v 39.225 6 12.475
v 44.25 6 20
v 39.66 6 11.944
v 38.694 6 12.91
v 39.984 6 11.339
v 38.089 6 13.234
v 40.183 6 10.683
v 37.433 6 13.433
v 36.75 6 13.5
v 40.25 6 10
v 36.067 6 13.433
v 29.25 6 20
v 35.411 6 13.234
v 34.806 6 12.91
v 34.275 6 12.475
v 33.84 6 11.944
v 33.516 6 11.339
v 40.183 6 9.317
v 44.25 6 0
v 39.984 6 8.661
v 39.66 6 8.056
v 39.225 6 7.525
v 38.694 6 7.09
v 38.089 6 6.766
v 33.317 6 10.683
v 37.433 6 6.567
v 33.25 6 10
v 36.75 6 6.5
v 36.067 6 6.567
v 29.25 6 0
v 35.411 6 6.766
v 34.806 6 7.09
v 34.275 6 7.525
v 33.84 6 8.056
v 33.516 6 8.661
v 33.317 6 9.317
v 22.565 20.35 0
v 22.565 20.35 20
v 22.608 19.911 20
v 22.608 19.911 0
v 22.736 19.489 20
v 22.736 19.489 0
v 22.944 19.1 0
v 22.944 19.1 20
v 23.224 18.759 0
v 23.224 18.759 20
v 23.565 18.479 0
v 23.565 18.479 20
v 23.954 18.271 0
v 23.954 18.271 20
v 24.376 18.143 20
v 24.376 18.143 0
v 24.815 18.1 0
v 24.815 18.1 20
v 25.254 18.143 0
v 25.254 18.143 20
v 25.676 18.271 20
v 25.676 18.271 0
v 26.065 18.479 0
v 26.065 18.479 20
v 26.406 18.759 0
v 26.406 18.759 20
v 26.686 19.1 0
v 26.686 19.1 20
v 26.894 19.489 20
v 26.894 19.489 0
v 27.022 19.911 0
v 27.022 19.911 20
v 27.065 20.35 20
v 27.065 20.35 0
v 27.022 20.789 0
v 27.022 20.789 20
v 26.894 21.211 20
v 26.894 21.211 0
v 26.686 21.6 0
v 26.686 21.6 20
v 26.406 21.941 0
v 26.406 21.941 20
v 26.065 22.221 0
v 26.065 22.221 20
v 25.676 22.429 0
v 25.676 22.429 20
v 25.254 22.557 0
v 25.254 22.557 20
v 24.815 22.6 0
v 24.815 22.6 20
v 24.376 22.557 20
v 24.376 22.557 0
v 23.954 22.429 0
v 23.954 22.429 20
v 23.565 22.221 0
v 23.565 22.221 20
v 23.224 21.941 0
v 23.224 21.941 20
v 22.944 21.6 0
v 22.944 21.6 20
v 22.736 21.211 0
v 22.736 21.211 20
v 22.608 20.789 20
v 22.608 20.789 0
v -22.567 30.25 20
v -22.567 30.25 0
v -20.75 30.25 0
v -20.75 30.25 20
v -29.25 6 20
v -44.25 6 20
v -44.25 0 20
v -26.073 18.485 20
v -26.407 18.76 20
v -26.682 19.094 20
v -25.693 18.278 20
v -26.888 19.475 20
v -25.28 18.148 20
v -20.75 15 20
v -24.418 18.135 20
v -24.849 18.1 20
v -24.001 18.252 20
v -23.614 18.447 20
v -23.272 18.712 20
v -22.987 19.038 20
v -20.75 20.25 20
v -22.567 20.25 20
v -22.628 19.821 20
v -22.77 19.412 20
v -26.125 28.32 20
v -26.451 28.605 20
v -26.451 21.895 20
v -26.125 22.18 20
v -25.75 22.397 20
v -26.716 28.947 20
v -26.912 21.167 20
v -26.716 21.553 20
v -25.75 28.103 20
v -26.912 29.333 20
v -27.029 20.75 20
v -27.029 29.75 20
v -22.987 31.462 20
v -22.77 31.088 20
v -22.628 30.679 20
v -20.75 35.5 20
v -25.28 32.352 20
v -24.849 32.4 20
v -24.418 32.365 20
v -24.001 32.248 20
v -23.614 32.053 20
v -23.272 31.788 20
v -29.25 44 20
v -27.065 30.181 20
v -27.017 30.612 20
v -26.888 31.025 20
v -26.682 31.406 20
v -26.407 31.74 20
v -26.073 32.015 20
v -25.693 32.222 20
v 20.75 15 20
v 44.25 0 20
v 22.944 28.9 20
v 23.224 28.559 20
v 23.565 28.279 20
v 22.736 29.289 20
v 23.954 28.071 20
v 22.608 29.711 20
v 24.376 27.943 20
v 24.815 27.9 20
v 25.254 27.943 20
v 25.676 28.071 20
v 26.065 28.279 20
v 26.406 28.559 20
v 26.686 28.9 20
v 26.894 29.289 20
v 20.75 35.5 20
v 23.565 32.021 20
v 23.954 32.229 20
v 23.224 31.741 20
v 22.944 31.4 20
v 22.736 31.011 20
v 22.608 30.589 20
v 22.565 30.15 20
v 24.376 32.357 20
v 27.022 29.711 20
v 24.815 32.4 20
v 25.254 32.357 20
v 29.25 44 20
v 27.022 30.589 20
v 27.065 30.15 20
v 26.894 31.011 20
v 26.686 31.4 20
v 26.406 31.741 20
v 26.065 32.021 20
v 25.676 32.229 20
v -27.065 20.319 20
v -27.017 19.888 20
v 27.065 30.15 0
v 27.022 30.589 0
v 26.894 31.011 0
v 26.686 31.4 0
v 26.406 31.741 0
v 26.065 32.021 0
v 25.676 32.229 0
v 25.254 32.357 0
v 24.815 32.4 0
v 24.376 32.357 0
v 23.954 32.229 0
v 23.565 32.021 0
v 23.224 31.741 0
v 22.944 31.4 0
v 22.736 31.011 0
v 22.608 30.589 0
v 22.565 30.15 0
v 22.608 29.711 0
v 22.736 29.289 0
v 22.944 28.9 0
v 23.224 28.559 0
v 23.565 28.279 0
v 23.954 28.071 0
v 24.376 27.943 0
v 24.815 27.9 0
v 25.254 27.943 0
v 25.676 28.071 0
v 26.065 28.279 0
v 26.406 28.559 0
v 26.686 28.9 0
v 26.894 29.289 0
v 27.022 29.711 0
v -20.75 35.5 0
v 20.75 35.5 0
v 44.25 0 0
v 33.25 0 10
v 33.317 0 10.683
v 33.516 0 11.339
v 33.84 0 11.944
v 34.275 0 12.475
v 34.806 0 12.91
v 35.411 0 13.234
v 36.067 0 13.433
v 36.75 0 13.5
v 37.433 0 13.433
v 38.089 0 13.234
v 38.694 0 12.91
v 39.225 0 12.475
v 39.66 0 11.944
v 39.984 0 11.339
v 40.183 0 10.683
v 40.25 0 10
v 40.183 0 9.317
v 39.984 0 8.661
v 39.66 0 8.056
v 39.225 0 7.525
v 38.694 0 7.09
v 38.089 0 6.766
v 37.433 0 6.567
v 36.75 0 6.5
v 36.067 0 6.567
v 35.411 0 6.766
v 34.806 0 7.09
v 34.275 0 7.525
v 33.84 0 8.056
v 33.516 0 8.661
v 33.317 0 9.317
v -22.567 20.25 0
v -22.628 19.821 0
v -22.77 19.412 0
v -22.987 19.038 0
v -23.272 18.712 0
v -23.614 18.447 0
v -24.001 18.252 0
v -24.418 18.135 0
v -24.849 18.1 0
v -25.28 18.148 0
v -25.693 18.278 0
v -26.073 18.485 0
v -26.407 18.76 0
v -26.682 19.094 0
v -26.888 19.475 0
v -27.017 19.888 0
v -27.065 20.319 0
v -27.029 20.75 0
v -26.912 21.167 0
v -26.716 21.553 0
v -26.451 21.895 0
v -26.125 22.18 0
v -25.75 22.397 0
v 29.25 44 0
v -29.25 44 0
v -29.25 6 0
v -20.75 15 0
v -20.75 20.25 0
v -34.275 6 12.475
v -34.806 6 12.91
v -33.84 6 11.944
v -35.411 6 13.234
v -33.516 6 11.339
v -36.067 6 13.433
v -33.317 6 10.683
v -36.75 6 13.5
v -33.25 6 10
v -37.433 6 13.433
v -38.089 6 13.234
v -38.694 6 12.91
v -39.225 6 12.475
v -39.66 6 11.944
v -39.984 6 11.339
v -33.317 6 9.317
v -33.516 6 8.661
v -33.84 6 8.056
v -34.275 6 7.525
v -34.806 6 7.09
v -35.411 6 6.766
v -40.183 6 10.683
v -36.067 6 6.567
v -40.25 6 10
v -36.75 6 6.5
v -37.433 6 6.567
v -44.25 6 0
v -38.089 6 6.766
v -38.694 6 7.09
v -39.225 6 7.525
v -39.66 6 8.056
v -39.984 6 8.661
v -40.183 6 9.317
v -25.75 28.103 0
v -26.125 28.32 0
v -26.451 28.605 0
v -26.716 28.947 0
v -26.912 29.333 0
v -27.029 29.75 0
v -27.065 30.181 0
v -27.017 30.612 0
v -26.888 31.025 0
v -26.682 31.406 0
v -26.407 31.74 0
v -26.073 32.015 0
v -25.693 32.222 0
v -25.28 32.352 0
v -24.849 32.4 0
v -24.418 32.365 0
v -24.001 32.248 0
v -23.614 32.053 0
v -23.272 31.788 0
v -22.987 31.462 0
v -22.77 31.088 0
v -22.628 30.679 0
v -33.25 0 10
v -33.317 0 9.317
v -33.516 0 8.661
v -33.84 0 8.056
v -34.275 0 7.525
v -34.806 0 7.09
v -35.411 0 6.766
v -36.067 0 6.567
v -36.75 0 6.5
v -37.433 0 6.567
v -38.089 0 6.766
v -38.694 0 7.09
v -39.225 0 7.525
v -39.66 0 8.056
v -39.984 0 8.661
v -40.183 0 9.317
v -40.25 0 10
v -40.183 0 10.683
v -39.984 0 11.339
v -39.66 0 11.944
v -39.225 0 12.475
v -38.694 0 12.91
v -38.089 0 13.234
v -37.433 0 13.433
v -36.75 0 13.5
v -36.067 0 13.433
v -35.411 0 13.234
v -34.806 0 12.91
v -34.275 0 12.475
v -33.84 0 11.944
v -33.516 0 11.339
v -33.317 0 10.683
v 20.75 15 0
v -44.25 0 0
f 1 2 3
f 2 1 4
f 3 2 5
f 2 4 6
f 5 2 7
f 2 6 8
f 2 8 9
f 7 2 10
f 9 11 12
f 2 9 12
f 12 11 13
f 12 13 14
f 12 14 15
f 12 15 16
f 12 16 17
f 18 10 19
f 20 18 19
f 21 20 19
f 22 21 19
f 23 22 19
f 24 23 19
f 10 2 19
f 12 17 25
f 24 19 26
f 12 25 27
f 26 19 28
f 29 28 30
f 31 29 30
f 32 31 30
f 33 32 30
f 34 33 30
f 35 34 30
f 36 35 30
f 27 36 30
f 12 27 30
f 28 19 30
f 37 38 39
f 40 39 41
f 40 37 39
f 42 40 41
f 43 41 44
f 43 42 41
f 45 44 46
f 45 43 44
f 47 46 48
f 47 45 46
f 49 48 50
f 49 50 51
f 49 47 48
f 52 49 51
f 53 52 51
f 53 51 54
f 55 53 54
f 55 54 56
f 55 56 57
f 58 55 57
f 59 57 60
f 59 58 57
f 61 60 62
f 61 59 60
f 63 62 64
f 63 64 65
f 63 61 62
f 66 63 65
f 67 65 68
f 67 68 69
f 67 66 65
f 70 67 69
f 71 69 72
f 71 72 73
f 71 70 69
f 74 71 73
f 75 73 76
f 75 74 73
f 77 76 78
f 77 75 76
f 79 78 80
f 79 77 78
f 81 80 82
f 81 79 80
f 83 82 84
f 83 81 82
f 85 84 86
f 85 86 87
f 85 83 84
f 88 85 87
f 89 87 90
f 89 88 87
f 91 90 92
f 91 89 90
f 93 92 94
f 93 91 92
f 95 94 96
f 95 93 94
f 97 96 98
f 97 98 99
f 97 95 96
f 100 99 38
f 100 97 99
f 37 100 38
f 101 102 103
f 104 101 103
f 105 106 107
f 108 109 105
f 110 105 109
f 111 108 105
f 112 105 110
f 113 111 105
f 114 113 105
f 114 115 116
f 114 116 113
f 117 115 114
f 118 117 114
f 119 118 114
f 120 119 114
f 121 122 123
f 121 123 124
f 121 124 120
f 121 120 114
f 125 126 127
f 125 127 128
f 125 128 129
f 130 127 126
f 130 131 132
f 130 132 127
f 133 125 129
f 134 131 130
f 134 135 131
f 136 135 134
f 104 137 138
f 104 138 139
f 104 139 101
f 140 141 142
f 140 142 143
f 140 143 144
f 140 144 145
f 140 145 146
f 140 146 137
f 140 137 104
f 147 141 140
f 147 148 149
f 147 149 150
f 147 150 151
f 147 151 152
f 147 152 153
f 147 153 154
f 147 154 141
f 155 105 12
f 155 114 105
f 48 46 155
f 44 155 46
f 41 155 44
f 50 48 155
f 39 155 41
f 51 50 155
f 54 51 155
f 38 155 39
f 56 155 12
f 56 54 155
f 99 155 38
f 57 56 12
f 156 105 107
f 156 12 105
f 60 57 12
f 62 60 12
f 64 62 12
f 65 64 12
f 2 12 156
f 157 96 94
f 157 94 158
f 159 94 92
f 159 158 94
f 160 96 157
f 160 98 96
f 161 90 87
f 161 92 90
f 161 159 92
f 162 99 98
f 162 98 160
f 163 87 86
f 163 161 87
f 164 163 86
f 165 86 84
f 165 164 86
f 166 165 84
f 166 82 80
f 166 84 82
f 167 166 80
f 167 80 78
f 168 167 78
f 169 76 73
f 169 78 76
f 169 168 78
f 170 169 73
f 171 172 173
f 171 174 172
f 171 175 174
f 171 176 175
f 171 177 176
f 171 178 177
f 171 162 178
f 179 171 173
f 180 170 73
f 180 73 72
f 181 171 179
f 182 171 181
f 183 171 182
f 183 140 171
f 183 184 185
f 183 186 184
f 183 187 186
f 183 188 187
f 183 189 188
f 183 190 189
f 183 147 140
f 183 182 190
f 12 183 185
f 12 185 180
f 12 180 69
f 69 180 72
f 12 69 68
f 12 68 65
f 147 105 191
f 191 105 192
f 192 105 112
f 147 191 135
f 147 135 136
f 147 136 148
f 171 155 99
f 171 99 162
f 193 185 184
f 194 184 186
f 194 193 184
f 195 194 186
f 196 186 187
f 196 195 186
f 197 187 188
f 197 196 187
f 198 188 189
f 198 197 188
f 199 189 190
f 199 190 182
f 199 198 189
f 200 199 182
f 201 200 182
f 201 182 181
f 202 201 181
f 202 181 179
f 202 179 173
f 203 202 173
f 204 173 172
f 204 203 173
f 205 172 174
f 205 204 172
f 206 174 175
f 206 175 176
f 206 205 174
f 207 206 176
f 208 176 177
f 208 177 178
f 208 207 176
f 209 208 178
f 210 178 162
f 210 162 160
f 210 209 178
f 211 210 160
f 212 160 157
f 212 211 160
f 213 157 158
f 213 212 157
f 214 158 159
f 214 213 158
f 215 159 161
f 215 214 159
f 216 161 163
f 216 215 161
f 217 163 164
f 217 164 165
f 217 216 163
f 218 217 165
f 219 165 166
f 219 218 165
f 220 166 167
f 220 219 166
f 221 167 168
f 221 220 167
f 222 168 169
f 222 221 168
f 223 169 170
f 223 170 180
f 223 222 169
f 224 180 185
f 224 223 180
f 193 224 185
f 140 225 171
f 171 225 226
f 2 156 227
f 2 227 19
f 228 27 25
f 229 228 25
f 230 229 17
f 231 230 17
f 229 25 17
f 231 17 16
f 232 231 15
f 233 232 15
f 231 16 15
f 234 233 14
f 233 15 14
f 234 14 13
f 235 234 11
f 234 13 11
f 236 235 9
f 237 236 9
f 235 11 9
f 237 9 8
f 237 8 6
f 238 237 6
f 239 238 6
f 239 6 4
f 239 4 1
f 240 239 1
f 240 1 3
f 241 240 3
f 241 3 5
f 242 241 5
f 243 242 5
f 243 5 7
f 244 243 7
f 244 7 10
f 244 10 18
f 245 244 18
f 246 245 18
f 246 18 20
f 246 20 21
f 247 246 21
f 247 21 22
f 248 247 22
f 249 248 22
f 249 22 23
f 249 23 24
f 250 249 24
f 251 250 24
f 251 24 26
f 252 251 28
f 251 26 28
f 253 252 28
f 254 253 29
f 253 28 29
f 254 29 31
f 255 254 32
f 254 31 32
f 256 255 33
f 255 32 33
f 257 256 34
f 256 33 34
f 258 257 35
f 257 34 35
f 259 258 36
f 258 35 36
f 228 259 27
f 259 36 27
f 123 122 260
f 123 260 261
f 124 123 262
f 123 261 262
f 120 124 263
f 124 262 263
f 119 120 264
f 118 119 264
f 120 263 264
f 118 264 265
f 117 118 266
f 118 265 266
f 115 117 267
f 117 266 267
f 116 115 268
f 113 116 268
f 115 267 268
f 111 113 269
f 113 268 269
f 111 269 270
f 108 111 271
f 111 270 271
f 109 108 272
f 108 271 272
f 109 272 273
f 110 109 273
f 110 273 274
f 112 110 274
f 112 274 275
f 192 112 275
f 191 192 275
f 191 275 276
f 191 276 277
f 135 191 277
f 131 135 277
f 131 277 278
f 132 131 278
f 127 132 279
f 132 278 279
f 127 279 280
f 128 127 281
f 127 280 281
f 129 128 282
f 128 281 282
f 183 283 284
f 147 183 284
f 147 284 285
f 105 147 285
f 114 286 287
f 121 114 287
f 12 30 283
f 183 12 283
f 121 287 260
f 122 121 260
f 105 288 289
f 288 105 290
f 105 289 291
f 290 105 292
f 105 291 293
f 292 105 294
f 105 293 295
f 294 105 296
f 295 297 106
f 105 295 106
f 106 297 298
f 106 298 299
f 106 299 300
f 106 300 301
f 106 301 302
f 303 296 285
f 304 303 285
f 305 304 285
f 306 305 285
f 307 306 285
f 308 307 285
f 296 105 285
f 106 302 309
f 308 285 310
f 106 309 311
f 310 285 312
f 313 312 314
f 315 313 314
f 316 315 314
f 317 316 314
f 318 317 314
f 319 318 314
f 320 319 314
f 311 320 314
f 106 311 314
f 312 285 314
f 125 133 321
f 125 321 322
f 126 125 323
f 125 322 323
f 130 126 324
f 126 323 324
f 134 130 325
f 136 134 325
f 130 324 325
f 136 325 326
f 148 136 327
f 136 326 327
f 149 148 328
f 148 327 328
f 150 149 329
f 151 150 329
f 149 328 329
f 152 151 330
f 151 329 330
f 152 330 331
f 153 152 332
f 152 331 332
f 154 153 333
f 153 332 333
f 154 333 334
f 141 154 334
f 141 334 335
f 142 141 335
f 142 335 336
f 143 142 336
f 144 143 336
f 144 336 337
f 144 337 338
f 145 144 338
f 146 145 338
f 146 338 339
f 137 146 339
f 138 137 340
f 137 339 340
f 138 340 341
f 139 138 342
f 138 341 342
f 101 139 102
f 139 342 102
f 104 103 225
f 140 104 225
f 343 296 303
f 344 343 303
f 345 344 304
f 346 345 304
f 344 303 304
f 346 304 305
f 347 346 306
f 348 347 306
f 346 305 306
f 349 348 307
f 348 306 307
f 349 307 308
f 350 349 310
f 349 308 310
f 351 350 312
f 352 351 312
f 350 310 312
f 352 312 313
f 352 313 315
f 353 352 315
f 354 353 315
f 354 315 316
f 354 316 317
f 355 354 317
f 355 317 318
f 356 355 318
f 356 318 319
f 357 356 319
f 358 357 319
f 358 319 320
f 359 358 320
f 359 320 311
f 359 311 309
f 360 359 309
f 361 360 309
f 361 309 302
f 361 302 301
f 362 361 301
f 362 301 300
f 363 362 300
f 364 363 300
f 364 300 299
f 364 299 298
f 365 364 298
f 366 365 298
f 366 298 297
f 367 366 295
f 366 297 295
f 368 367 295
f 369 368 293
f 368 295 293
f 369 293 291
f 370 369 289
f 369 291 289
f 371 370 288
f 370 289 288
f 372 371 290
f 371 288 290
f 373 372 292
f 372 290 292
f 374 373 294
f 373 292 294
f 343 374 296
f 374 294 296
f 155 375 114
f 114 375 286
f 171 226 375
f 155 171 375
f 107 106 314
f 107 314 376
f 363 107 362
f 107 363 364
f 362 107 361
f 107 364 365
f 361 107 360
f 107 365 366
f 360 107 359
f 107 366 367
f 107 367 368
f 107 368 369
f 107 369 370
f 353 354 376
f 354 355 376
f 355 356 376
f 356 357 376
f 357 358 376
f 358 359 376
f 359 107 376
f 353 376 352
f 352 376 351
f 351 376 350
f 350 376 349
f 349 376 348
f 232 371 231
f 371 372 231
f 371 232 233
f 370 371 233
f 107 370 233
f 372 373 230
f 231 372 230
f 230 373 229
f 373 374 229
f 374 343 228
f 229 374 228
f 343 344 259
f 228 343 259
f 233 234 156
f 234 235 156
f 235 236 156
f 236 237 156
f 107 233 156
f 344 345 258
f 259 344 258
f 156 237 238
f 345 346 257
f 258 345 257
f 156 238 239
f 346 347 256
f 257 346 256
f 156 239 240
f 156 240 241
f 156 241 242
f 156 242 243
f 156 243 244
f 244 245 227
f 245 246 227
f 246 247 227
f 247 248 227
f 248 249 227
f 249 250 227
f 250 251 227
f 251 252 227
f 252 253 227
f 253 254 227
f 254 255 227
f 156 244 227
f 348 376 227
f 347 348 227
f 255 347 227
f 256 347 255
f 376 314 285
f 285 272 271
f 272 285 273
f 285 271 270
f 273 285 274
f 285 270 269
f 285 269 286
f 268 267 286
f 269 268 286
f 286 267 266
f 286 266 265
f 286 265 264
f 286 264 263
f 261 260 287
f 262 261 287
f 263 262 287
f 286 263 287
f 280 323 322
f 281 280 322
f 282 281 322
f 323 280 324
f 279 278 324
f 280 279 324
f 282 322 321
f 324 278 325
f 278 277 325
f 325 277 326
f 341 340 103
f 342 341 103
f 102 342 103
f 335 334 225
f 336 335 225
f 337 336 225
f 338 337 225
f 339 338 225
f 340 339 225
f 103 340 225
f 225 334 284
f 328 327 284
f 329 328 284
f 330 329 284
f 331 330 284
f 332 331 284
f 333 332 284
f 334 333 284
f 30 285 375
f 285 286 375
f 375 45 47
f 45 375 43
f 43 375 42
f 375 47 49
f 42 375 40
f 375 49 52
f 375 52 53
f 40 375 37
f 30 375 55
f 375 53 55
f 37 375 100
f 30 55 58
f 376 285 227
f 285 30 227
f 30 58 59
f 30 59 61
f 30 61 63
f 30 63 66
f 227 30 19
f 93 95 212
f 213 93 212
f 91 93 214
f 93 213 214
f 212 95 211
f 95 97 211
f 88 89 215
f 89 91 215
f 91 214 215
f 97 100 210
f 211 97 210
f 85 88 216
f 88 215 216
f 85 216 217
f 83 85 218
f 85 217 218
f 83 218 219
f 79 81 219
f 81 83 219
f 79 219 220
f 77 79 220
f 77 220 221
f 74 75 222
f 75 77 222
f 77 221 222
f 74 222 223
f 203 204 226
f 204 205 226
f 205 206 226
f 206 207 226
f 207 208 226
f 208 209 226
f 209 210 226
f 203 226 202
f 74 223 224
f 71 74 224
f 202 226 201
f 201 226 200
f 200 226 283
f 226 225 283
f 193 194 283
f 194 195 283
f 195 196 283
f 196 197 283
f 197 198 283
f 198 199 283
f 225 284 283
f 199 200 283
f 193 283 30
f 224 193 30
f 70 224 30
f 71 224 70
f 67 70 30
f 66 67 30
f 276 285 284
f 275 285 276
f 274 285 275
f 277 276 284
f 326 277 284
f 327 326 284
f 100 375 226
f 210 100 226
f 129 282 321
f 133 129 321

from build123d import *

# Parameters (mm, degrees)
SKETCH1_R           = 2.25
BOSS_EXTRUDE1_DEPTH = 20
SKETCH2_R           = 3.5
CUT_EXTRUDE1_DEPTH  = 62.660866844


with BuildPart() as part:
    # Sketch1 → Boss-Extrude1 (new body)
    with BuildSketch(Plane.XY):
        Polygon((-44.25, 0), (44.25, 0), (44.25, 6), (29.25, 6), (29.25, 44), (-29.25, 44), (-29.25, 6), (-44.25, 6), align=None)
        with Locations((24.815, 30.15)):
            Circle(SKETCH1_R, mode=Mode.SUBTRACT)
        with Locations(Location((24.815, 20.35, 0), (0, 0, 180))):
            Circle(SKETCH1_R, mode=Mode.SUBTRACT)
        with BuildLine():
            Line((-20.75, 35.5), (20.75, 35.5))
            Line((20.75, 35.5), (20.75, 15))
            Line((20.75, 15), (-20.75, 15))
            Line((-20.75, 15), (-20.75, 20.25))
            Line((-20.75, 20.25), (-22.567223321, 20.25))
            ThreePointArc((-22.567223321, 20.25), (-26.07307026, 18.484588726), (-25.75, 22.396527547))
            Line((-25.75, 22.396527547), (-25.75, 28.103472453))
            ThreePointArc((-25.75, 28.103472453), (-26.07307026, 32.015411274), (-22.567223321, 30.25))
            Line((-22.567223321, 30.25), (-20.75, 30.25))
            Line((-20.75, 30.25), (-20.75, 35.5))
        make_face(mode=Mode.SUBTRACT)
    extrude(amount=BOSS_EXTRUDE1_DEPTH)

    # Sketch2 → Cut-Extrude1 (cut, through all)
    with BuildSketch(Plane(origin=(0, 6, 0), x_dir=(1, 0, 0), z_dir=(0, 1, 0))):
        with Locations(Location((36.75, -10, 0), (0, 0, 180))):
            Circle(SKETCH2_R)
        with Locations((-36.75, -10)):
            Circle(SKETCH2_R)
    extrude(amount=-CUT_EXTRUDE1_DEPTH, mode=Mode.SUBTRACT)


solid = part.part
